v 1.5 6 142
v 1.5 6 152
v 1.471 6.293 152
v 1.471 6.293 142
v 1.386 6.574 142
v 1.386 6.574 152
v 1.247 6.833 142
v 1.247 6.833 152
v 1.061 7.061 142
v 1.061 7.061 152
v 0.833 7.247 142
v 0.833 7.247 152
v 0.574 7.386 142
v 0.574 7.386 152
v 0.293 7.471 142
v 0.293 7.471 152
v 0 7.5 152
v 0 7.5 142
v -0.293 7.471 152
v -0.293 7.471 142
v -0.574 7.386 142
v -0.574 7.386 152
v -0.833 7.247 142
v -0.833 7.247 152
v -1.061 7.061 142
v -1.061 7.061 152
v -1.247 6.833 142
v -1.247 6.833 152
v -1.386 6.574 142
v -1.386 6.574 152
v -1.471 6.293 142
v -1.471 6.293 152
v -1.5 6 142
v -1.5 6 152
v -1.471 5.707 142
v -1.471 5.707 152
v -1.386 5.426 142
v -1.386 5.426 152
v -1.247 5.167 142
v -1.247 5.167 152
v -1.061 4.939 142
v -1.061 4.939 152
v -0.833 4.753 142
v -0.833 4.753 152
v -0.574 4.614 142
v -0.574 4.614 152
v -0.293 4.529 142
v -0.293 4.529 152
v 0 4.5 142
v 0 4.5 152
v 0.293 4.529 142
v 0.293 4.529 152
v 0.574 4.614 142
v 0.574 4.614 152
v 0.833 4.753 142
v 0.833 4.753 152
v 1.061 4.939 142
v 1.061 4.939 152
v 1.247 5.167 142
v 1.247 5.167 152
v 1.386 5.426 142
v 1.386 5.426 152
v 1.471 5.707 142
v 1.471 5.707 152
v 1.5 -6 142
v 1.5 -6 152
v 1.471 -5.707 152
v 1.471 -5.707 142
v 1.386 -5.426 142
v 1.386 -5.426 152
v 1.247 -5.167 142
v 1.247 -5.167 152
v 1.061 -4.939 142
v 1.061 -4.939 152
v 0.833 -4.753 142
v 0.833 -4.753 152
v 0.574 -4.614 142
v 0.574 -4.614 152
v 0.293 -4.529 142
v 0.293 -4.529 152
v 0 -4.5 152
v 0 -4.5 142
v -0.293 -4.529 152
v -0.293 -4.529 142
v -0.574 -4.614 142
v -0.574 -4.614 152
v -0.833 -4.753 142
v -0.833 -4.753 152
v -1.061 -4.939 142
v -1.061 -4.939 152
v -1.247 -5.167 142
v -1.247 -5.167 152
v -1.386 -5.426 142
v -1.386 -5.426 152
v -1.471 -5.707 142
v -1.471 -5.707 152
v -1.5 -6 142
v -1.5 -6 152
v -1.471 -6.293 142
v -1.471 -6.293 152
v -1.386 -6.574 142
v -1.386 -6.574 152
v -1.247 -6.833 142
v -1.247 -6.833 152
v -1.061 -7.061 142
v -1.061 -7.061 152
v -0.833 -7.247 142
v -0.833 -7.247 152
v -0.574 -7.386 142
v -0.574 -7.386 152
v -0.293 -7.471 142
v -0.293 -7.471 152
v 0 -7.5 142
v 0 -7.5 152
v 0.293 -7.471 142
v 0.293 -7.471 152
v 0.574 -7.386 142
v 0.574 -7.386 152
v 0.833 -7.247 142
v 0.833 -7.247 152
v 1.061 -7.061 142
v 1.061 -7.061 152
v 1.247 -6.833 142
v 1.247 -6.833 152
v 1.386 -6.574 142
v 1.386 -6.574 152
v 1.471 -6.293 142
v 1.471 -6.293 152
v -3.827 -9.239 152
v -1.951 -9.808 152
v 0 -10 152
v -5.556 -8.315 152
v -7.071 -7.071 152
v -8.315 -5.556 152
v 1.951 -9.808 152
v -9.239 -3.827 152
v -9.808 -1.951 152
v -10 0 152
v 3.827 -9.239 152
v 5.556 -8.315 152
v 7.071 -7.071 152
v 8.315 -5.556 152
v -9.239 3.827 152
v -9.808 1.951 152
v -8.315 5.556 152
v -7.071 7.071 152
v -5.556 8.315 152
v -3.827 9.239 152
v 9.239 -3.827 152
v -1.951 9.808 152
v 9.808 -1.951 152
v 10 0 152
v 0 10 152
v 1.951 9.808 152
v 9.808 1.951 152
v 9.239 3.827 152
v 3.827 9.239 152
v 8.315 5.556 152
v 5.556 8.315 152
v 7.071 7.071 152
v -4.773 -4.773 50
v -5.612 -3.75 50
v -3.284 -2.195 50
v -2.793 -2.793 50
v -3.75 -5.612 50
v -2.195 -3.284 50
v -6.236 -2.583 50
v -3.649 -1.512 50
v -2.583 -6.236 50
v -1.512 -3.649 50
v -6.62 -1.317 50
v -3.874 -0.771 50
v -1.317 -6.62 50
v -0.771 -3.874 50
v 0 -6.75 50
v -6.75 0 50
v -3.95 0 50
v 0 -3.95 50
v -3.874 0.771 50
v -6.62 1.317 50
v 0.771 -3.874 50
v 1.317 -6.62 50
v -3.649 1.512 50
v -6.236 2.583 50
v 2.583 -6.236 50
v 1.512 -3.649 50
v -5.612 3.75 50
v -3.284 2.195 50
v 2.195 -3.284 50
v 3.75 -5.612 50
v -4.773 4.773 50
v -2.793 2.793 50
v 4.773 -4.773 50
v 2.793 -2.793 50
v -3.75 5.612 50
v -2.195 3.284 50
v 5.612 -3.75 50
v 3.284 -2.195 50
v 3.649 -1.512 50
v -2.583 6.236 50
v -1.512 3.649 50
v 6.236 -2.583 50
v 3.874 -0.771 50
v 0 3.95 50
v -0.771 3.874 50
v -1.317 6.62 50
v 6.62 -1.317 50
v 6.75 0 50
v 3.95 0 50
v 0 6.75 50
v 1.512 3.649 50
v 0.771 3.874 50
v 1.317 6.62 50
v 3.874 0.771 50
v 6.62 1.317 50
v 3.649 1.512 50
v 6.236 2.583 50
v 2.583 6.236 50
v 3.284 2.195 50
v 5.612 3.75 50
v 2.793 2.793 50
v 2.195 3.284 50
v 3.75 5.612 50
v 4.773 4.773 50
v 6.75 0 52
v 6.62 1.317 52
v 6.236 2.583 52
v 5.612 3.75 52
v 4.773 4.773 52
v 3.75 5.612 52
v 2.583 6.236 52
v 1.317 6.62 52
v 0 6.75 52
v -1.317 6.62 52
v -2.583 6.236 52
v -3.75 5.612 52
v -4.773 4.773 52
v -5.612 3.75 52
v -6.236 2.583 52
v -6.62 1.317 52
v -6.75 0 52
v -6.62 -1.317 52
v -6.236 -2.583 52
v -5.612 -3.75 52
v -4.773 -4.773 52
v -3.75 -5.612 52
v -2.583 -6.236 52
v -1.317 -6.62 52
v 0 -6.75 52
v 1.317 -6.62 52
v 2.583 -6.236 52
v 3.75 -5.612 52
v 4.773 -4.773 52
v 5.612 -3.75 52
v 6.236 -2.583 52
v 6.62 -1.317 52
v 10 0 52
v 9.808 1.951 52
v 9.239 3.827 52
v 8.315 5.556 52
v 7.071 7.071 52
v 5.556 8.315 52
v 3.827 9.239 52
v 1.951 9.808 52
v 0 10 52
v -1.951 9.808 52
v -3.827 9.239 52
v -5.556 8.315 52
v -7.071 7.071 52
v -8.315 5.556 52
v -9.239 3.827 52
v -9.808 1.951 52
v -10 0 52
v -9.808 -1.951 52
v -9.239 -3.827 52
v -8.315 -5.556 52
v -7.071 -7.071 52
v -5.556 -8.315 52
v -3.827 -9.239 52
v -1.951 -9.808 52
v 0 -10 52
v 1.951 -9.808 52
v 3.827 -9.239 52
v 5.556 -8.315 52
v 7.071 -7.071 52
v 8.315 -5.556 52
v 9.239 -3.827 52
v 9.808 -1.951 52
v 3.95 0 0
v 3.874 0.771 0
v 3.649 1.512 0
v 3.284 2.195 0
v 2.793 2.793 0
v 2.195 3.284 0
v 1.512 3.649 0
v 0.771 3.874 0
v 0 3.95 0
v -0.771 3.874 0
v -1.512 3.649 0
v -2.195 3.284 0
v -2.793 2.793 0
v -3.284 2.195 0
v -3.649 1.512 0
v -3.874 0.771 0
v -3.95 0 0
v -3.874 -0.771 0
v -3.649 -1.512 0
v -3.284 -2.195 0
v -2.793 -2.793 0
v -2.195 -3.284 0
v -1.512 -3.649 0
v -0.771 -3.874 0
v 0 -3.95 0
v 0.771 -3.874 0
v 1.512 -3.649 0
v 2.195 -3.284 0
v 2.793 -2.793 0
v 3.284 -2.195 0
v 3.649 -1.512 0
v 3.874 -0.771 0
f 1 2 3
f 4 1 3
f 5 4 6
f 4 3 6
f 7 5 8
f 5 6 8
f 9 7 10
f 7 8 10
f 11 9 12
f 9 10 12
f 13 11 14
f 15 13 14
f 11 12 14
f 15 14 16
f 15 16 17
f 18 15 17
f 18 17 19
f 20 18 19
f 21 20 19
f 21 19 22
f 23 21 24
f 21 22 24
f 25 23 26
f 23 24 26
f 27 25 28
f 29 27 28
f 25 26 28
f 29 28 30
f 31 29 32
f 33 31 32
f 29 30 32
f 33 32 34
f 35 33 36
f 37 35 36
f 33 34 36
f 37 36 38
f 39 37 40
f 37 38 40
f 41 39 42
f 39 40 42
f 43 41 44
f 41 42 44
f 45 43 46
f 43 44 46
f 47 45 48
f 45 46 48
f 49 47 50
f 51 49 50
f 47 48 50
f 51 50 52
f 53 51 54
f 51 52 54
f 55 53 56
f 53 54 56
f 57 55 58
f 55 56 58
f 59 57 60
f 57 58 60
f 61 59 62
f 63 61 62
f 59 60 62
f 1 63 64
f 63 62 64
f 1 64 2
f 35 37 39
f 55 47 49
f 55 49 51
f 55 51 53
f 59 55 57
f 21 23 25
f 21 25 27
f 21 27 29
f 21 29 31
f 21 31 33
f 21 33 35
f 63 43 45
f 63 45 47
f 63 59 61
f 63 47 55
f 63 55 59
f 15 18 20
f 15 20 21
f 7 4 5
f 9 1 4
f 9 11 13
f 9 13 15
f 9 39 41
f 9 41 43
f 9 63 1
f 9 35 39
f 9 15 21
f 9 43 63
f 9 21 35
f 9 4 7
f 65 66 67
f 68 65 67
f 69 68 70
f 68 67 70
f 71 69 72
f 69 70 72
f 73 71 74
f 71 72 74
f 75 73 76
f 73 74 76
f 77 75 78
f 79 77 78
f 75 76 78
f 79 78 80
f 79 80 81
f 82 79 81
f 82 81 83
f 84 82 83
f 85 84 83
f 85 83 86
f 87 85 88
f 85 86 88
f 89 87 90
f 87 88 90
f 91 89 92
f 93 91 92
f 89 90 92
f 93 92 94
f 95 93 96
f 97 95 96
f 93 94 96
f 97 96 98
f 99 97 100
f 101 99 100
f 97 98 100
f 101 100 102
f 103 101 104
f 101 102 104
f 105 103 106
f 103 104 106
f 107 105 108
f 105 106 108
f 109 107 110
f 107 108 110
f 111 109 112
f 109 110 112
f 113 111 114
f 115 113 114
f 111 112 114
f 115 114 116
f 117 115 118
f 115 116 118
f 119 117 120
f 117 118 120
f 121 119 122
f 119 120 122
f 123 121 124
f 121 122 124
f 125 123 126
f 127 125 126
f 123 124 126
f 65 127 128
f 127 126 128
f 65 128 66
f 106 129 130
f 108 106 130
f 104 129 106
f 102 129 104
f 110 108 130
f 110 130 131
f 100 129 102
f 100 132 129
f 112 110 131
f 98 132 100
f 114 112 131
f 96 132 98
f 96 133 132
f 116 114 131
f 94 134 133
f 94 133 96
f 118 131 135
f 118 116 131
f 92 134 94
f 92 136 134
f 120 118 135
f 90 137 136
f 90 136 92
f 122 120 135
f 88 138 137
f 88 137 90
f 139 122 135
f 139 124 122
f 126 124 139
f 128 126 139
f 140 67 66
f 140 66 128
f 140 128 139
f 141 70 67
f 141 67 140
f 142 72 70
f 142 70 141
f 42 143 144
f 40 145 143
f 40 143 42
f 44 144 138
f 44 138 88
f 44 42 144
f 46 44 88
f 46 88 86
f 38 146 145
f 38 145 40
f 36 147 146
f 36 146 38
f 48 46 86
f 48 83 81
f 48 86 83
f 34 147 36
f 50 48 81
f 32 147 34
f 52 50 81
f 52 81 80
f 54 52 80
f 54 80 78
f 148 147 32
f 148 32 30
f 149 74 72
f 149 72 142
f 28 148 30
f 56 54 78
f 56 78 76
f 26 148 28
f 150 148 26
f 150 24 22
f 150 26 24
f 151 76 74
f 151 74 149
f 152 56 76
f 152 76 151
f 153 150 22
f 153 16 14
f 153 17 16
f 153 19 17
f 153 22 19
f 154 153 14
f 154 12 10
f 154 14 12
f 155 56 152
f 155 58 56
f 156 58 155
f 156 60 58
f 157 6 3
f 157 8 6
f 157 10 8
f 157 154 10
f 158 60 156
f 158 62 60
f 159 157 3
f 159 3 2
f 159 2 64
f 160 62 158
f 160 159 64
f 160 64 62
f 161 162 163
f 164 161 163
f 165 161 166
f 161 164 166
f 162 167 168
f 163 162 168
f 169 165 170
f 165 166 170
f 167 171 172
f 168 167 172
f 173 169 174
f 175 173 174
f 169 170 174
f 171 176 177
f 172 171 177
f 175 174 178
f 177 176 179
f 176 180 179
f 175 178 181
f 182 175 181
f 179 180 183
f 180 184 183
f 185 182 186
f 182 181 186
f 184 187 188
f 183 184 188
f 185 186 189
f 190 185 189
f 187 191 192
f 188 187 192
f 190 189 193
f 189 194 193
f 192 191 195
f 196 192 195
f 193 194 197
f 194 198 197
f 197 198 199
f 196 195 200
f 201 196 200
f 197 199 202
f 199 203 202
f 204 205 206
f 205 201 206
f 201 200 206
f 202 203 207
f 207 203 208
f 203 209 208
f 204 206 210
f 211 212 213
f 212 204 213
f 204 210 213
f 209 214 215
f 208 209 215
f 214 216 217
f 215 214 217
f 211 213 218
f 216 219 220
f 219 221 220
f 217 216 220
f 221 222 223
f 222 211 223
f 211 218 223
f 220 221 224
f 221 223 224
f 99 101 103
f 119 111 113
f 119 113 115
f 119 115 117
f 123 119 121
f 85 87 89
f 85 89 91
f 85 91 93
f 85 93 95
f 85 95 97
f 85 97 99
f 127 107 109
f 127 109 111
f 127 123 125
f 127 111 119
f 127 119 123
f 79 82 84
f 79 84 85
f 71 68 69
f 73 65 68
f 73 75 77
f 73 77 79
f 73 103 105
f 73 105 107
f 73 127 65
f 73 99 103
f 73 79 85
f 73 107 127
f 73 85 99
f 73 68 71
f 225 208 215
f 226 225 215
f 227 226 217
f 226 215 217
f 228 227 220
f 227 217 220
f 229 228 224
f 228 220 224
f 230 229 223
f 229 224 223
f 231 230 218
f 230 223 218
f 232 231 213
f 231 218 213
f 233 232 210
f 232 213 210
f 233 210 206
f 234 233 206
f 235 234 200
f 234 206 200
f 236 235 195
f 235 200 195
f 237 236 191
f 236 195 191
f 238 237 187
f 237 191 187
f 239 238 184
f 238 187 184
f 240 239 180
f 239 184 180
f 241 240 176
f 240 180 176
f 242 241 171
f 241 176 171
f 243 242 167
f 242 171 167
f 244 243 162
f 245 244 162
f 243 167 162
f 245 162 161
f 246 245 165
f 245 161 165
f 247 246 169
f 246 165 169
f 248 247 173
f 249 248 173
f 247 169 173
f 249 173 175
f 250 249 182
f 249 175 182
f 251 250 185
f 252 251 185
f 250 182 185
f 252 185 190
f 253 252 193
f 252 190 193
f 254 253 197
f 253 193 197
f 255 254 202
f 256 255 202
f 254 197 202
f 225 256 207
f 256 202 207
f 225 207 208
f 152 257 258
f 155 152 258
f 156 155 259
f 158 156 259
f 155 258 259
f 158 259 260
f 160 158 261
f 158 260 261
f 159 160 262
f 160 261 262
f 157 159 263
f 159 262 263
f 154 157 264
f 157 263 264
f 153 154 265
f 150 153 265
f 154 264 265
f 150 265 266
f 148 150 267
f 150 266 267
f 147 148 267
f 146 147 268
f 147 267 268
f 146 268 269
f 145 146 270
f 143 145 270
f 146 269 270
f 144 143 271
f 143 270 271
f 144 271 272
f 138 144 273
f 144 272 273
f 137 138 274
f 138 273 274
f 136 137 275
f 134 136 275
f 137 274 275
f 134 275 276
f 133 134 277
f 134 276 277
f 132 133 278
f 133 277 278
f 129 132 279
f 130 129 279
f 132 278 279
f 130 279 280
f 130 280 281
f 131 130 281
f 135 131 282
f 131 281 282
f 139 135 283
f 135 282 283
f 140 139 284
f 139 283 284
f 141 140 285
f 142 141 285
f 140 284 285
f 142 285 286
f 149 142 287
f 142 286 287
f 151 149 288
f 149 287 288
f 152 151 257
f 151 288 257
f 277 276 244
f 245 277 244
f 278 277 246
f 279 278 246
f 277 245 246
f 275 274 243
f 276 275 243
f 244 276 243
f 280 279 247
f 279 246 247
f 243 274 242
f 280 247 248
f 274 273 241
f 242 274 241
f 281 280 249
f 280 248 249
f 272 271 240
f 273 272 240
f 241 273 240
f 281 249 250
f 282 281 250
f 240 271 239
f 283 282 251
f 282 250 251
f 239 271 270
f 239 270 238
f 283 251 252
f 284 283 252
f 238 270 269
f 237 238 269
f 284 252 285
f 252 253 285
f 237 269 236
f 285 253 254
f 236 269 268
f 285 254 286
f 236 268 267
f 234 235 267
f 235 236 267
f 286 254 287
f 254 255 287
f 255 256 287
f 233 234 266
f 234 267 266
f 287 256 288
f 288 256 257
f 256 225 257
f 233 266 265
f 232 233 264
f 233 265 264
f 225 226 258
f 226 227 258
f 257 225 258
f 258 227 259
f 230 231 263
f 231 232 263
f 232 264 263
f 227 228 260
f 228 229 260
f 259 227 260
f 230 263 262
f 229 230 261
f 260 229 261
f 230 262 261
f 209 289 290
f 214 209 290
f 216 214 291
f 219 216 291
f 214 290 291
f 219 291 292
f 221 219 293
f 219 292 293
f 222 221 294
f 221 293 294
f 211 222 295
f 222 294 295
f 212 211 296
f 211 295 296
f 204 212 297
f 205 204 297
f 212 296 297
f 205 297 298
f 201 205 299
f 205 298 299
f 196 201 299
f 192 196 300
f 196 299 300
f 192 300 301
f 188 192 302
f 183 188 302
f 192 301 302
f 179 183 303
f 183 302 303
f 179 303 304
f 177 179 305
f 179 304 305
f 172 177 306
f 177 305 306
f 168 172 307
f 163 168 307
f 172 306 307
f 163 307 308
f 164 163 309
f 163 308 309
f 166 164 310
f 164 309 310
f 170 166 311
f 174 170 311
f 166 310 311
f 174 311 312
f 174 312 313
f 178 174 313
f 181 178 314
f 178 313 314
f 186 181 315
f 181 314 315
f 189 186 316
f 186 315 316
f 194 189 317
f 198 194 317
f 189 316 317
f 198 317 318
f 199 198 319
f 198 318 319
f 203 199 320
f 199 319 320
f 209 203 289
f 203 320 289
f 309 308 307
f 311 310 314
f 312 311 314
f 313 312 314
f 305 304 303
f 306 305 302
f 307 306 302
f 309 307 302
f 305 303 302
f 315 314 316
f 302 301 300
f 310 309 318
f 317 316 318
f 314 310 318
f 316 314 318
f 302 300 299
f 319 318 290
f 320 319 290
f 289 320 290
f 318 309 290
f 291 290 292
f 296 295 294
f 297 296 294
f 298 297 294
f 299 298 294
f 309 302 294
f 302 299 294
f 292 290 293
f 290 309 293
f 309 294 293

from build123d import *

# Parameters (mm, degrees)
F0_R     = 3.95
F1_DEPTH = 50
F2_R     = 6.75
F2_R_2   = 3.95
F3_DEPTH = 2
F4_R     = 10
F4_R_2   = 6.75
F5_DEPTH = 100
F6_R     = 1.5
F7_DEPTH = 10


with BuildPart() as f1:
    # F0 (on Top) → F1 (new body)
    with BuildSketch(Plane.XY):
        Circle(F0_R)
    extrude(amount=F1_DEPTH)

    # F2 (on face) → F3 (join)
    with BuildSketch(Plane.XY.offset(50)):
        Circle(F2_R)
        Circle(F2_R_2, mode=Mode.SUBTRACT)
        Circle(F2_R_2)
    extrude(amount=F3_DEPTH)

    # F4 (on face) → F5 (join)
    with BuildSketch(Plane.XY.offset(52)):
        Circle(F4_R)
        Circle(F4_R_2, mode=Mode.SUBTRACT)
        Circle(F4_R_2)
    extrude(amount=F5_DEPTH)

    # F6 (on face) → F7 (cut)
    with BuildSketch(Plane.XY.offset(152)):
        with Locations((0, 6)):
            Circle(F6_R)
        with Locations((0, -6)):
            Circle(F6_R)
    extrude(amount=-F7_DEPTH, mode=Mode.SUBTRACT)


solid = f1.part
